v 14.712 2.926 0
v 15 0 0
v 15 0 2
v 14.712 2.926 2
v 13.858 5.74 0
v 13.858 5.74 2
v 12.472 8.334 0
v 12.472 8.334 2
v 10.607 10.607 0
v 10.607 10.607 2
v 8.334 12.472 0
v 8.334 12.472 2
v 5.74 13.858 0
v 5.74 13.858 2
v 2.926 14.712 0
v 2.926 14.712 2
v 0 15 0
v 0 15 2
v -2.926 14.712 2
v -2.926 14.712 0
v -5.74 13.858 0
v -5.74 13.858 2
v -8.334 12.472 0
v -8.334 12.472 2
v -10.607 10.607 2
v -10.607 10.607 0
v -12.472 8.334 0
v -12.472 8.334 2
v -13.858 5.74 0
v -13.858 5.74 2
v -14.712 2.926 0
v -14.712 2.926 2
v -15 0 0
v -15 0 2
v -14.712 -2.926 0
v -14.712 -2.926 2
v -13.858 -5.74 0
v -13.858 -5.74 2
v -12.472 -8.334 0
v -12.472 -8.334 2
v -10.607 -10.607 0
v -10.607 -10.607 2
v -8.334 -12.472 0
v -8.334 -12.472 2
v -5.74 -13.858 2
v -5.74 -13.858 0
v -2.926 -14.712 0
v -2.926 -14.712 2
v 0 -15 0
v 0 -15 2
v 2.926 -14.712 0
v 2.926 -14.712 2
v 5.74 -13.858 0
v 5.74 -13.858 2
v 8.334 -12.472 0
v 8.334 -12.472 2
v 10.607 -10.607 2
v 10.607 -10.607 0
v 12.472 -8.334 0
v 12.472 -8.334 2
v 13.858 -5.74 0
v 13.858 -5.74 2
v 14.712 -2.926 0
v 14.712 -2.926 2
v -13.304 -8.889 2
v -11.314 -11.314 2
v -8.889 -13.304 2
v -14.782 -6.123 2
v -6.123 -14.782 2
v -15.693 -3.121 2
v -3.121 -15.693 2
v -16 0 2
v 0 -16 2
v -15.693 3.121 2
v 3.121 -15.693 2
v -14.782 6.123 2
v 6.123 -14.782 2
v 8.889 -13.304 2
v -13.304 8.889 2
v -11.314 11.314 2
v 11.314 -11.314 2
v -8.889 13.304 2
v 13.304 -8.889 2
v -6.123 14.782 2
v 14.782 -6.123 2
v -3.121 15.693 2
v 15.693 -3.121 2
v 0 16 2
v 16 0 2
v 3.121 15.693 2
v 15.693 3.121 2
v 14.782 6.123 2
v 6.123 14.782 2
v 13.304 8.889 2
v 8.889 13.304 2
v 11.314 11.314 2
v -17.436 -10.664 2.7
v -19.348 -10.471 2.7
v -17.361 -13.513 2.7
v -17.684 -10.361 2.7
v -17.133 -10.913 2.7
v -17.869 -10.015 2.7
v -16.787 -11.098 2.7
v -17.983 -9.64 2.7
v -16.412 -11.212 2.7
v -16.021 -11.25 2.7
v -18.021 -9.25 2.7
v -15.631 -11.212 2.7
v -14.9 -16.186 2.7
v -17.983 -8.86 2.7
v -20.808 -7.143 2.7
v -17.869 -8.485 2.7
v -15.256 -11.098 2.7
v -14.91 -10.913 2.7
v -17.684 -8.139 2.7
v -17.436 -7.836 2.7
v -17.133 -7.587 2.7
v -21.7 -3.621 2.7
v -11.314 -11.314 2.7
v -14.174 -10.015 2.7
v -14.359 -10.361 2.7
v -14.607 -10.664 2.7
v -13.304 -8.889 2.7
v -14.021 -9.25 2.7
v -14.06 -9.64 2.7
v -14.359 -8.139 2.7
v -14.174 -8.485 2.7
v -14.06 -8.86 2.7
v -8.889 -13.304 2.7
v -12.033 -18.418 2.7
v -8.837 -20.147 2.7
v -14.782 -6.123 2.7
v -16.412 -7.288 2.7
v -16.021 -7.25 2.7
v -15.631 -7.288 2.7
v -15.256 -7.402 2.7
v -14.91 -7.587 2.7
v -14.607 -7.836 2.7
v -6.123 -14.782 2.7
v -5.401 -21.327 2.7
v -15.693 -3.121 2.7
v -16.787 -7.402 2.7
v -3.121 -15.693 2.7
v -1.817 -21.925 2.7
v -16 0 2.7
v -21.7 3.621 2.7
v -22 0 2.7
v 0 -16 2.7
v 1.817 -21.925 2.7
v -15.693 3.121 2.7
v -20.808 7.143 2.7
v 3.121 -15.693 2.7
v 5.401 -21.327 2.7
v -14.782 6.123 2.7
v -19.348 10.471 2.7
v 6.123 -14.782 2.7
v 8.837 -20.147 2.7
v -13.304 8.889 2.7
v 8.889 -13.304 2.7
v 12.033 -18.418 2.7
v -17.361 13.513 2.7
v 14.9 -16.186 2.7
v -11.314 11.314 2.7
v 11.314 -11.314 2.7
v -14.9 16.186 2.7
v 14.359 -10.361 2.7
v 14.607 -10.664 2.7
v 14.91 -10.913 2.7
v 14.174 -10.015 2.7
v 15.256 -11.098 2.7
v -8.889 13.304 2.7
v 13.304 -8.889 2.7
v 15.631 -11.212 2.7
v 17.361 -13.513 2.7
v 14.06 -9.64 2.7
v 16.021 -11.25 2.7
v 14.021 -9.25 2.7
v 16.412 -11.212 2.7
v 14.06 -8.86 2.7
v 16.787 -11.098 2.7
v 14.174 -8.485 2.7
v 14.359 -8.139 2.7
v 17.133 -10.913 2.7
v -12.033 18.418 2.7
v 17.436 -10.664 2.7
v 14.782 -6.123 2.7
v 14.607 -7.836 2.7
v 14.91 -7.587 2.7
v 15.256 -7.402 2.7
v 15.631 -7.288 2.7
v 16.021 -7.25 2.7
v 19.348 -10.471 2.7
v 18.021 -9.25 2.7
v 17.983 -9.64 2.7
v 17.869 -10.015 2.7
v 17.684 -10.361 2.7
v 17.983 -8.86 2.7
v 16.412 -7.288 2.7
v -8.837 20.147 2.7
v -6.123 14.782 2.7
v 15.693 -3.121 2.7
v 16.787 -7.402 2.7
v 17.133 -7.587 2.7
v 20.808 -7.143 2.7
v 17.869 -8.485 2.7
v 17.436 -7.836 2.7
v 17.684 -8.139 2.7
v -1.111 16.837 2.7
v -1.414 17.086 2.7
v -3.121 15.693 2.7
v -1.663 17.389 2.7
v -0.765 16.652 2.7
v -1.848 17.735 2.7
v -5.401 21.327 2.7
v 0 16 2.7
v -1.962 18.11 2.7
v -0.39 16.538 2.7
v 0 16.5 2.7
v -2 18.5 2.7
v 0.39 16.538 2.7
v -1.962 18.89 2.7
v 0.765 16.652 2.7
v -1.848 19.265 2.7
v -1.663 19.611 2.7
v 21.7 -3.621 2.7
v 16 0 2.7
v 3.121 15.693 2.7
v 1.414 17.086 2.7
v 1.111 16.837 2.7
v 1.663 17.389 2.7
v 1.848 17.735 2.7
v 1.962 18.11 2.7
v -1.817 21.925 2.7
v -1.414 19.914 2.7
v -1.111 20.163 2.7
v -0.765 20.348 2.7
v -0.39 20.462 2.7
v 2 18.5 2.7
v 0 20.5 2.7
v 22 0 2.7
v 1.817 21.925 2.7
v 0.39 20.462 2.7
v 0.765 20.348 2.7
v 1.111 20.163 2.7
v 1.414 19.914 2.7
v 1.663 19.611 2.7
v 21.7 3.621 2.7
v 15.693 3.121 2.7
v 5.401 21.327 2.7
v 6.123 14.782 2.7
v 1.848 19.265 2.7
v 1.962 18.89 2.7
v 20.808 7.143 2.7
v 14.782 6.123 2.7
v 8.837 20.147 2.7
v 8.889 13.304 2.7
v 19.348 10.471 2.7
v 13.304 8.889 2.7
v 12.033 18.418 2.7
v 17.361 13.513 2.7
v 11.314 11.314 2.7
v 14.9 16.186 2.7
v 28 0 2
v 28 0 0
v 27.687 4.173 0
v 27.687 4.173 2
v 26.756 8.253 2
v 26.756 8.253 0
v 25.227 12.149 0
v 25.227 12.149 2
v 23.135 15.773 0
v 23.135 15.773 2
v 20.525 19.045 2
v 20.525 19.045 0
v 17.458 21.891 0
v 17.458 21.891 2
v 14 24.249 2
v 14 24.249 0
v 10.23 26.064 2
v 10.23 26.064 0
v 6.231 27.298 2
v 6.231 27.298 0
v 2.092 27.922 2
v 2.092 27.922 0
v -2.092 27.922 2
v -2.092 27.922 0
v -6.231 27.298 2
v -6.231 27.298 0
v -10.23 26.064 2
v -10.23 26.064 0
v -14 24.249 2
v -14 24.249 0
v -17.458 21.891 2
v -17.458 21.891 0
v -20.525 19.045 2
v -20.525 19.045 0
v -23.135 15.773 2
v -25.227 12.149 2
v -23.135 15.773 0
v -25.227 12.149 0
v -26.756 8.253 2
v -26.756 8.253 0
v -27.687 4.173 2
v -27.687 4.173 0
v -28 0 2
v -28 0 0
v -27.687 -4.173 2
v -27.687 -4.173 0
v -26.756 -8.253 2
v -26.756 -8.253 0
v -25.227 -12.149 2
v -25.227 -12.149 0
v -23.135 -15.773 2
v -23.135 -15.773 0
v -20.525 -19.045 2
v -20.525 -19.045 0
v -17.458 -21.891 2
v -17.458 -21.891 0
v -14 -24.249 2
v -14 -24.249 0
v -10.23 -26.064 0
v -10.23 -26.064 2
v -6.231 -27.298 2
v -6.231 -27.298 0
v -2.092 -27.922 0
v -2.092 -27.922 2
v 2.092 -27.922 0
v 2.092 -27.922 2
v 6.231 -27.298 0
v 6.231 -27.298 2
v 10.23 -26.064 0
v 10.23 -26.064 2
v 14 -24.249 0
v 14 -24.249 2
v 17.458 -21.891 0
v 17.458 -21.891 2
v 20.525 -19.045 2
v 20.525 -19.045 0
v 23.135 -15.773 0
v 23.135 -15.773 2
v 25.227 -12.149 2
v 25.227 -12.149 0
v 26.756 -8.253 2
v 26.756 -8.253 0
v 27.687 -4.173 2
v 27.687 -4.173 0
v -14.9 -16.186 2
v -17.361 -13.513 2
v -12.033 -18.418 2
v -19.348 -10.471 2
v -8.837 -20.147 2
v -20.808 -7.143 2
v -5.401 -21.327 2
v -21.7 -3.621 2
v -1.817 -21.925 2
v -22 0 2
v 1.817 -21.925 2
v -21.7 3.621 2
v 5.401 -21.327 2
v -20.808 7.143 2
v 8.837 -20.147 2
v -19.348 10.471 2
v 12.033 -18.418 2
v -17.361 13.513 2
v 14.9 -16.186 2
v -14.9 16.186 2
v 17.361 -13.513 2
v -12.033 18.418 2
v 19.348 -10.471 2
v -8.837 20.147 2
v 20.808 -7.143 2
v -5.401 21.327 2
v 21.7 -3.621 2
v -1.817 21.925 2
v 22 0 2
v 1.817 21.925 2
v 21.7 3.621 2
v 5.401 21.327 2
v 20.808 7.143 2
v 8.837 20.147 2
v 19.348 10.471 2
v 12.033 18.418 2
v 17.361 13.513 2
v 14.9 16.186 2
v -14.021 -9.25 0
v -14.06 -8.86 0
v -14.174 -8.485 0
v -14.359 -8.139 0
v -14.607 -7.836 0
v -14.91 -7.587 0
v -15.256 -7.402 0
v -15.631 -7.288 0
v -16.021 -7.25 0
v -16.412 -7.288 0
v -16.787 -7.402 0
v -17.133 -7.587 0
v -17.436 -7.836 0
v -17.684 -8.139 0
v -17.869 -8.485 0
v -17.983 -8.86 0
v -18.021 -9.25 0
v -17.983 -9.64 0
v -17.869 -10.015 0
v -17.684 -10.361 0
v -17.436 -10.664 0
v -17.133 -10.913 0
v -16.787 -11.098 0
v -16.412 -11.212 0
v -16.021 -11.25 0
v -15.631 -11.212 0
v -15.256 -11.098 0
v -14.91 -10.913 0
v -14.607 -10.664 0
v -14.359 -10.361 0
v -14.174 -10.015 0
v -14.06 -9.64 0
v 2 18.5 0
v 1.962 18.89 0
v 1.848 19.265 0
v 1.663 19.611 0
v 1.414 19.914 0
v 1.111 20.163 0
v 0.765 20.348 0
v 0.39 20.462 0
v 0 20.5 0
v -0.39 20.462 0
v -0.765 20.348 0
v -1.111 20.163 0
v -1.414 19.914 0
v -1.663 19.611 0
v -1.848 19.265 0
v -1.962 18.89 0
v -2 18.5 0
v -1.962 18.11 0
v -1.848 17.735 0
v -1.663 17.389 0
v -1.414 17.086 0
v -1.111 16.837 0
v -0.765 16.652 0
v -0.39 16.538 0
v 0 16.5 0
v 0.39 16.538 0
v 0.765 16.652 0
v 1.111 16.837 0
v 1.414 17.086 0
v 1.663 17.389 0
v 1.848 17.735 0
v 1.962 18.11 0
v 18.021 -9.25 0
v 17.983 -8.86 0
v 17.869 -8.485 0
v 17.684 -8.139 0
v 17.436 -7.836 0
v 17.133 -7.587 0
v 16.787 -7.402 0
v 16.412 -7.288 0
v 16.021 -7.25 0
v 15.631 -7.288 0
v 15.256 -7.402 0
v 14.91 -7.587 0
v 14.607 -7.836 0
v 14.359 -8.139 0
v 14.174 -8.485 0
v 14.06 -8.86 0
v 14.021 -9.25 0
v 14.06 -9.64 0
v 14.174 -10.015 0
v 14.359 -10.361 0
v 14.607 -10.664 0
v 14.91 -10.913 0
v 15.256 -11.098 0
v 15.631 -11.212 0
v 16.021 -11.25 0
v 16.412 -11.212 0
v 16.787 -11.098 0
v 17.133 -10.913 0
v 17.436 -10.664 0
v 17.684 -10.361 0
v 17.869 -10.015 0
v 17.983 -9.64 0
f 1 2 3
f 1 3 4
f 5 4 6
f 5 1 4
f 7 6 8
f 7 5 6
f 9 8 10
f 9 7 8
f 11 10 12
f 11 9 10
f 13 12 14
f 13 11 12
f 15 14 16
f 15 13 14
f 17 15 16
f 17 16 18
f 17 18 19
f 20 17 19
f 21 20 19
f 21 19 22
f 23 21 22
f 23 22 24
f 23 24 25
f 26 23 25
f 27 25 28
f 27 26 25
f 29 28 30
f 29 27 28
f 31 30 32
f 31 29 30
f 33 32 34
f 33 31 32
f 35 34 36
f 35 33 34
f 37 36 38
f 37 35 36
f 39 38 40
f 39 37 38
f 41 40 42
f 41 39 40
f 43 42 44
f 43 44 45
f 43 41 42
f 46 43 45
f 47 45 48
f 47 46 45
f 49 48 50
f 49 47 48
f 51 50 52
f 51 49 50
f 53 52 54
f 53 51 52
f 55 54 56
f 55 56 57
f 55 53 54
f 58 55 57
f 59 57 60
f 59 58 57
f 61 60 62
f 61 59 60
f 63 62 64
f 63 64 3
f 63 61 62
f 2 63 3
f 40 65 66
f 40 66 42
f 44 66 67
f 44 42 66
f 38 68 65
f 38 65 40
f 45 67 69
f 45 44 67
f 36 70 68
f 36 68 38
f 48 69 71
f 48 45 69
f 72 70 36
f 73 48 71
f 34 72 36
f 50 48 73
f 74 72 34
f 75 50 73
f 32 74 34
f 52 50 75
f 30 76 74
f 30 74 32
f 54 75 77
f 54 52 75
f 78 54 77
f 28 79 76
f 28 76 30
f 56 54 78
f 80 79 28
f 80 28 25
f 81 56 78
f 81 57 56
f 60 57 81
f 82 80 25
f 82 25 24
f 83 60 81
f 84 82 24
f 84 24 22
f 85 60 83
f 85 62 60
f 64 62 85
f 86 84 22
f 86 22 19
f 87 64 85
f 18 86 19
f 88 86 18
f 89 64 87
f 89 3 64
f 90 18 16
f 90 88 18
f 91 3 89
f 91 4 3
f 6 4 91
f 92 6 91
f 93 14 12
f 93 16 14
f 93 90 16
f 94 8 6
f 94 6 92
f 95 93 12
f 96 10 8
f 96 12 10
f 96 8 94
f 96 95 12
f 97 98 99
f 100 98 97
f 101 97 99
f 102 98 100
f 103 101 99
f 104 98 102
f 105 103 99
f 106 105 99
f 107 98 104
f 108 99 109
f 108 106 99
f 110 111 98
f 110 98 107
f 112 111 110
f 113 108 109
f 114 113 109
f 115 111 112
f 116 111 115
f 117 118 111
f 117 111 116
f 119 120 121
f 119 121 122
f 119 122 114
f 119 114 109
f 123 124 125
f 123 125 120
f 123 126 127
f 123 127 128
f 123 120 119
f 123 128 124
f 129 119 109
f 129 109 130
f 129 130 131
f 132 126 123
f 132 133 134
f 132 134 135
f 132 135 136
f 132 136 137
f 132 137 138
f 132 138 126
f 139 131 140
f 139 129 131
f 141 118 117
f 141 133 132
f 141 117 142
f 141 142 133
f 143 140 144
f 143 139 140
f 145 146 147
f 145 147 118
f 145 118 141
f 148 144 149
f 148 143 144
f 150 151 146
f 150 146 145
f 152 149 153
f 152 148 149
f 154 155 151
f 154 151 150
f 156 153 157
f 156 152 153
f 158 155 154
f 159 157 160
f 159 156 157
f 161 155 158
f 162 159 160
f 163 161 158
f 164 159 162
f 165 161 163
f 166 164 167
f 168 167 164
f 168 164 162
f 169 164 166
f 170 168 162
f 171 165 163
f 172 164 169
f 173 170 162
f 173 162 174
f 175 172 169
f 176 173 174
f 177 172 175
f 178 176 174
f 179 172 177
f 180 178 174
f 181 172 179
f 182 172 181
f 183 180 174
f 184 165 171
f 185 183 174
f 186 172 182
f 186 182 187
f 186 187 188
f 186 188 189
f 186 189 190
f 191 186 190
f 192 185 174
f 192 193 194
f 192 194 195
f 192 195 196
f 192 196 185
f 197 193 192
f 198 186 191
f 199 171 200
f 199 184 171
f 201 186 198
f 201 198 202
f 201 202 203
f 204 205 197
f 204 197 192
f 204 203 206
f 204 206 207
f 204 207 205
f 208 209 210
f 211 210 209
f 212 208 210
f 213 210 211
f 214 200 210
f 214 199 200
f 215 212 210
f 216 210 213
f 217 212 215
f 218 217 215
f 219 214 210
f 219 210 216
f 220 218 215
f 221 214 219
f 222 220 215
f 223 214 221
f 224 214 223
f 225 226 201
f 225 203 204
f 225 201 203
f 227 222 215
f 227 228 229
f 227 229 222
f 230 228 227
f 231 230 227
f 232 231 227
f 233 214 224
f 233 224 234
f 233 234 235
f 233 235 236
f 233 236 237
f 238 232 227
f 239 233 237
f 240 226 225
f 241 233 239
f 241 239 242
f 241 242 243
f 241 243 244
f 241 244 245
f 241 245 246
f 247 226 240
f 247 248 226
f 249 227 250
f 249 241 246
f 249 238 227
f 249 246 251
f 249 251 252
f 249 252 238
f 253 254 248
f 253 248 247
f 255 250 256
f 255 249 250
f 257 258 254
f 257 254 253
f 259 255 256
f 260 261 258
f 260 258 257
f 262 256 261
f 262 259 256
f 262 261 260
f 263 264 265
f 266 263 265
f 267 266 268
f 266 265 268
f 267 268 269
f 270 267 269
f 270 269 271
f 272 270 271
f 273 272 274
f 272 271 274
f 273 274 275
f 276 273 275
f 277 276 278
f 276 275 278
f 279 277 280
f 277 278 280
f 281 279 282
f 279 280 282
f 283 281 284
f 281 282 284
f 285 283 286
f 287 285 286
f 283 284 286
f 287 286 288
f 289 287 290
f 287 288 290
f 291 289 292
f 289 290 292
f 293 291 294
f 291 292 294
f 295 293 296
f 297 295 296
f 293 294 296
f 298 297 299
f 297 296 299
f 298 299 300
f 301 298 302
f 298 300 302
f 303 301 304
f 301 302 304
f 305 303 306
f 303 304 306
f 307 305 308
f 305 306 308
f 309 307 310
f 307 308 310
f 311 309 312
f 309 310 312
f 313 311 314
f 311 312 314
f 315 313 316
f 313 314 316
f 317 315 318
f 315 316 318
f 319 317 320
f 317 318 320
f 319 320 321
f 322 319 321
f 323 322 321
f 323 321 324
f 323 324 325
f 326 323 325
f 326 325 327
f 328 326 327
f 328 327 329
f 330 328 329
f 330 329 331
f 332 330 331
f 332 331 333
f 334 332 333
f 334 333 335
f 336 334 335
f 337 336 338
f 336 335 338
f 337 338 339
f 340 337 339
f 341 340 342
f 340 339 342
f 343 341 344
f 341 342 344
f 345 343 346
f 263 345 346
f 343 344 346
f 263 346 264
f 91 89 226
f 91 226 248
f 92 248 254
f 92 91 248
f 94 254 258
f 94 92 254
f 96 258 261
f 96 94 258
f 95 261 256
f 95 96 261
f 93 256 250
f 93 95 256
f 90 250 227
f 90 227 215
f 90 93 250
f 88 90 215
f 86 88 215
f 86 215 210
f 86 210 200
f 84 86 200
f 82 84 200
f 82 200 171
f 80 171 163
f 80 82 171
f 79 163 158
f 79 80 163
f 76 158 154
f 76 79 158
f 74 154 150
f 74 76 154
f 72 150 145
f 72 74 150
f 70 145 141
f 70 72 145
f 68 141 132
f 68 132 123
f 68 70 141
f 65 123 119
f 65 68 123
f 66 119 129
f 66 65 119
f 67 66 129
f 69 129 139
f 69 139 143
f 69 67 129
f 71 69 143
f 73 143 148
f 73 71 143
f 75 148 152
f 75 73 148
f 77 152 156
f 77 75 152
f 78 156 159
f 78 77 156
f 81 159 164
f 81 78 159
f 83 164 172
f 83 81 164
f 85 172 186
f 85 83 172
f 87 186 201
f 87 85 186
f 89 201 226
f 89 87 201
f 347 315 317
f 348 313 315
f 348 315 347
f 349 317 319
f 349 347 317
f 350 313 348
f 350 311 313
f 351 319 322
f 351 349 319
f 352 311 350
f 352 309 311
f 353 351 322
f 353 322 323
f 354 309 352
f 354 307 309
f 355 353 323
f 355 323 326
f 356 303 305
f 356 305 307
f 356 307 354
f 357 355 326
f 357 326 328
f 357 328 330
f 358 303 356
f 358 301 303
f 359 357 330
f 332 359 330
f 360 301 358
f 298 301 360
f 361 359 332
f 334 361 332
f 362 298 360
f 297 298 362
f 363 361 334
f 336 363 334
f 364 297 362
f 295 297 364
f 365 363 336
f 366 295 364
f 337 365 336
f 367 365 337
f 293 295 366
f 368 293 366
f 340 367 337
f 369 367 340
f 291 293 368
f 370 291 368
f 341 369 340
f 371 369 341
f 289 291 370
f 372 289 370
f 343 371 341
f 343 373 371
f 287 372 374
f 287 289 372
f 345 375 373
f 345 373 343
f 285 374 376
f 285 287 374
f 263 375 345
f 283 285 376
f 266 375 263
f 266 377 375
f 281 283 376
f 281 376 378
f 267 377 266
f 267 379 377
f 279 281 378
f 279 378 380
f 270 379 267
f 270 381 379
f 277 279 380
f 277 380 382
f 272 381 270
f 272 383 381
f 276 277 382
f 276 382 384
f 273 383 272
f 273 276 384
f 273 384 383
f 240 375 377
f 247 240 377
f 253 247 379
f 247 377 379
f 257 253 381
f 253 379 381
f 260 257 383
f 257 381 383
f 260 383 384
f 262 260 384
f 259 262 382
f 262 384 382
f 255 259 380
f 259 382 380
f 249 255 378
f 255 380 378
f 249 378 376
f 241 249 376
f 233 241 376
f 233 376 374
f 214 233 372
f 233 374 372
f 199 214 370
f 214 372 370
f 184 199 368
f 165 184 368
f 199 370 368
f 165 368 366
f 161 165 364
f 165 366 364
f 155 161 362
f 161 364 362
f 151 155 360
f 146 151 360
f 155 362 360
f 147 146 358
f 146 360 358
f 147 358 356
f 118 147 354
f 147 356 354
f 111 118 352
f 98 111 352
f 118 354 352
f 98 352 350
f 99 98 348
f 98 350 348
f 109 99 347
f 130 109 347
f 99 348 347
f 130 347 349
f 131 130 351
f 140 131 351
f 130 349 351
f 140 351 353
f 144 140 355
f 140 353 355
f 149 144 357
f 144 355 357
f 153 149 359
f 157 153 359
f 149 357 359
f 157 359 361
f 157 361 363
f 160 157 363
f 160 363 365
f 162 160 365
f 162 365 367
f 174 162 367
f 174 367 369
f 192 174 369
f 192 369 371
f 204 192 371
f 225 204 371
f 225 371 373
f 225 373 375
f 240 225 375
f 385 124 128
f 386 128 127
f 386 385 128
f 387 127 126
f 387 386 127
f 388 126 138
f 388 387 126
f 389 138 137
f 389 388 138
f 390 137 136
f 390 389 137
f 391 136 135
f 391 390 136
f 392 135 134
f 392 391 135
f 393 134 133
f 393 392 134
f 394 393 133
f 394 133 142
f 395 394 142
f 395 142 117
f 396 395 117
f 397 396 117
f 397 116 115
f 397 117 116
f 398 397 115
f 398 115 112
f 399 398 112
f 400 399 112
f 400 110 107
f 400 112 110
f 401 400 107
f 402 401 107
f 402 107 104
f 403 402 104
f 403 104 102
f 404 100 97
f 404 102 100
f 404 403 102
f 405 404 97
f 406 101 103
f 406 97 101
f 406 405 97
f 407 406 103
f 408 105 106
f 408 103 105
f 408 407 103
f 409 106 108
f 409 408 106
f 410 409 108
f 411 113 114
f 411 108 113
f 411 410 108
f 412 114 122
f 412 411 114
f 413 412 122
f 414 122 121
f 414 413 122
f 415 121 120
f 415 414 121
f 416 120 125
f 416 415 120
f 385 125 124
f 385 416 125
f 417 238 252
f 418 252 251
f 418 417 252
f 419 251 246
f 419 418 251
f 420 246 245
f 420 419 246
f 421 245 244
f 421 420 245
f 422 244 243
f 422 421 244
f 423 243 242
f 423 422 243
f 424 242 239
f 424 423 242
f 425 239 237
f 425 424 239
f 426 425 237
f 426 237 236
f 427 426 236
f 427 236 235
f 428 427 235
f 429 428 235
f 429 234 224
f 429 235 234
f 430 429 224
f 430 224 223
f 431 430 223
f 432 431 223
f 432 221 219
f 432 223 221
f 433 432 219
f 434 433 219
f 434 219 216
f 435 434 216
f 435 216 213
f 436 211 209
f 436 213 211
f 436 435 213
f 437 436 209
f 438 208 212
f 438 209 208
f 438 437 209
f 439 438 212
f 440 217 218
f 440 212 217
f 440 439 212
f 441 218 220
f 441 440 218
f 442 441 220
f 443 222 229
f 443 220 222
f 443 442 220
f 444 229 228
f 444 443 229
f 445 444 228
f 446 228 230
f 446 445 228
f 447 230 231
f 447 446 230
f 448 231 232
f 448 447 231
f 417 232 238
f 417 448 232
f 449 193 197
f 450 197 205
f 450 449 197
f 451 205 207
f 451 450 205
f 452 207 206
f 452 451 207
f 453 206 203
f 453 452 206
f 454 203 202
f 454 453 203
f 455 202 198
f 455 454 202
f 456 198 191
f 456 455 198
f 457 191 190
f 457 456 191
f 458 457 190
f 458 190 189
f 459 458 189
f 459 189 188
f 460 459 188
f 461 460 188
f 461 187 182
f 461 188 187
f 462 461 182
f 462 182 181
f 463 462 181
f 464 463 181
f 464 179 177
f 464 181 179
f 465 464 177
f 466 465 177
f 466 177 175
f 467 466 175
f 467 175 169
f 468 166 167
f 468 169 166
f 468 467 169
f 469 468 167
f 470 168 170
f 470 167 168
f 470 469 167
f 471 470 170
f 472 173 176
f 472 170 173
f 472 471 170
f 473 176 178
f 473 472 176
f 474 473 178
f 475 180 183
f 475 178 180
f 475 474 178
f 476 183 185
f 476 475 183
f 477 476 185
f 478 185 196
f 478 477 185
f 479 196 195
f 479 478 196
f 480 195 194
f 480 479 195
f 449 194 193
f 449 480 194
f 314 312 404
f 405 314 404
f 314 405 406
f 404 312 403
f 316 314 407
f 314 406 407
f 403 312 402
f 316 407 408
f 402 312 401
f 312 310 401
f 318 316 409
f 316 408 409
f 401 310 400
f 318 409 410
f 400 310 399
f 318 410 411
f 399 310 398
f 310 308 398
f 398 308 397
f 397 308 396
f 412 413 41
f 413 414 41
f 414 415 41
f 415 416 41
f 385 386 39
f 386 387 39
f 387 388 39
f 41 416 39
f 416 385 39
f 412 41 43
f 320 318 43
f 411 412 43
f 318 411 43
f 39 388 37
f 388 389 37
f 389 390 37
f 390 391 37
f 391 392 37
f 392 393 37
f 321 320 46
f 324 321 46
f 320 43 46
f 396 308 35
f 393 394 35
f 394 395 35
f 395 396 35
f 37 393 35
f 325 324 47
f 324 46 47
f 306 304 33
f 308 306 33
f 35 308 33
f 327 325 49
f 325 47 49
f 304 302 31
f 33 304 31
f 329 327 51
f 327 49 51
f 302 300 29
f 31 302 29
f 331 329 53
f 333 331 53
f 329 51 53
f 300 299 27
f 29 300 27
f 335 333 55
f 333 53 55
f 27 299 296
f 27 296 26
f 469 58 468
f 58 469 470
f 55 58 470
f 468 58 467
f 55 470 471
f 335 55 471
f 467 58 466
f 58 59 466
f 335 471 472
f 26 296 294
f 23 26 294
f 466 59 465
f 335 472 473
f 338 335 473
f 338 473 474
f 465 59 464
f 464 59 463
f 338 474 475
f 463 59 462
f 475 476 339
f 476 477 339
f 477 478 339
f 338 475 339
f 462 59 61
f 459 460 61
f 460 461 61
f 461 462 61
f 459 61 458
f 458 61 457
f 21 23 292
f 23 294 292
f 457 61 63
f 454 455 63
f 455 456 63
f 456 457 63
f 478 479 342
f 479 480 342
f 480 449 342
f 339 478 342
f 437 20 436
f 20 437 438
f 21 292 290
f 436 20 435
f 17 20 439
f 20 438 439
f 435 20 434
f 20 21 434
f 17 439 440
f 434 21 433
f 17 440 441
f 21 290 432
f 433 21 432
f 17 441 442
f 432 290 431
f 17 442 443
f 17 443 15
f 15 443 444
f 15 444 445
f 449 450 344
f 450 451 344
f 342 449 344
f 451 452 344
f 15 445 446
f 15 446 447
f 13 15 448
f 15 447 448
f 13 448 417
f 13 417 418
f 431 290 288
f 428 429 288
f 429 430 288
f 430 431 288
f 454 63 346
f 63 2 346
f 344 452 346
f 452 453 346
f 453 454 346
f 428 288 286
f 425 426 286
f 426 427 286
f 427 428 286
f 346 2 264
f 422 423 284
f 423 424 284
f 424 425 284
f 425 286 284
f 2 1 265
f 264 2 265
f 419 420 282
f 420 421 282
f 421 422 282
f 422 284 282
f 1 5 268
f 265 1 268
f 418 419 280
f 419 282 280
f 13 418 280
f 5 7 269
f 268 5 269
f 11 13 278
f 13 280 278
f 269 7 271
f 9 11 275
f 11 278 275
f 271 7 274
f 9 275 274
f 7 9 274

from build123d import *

# Parameters (mm, degrees)
SKETCH_R      = 28
SKETCH_R_2    = 15
PAD_DEPTH     = 2
SKETCH003_R   = 22
SKETCH003_R_2 = 16
PAD001_DEPTH  = 0.7
SKETCH002_R   = 2
POCKET_DEPTH  = 2.701


with BuildPart() as part:
    # Sketch → Pad (new body)
    with BuildSketch(Plane.XY):
        Circle(SKETCH_R)
        Circle(SKETCH_R_2, mode=Mode.SUBTRACT)
    extrude(amount=PAD_DEPTH)

    # Sketch003 (on Face4 of Pad) → Pad001 (join)
    with BuildSketch(Plane.XY.offset(2)):
        Circle(SKETCH003_R)
        Circle(SKETCH003_R_2, mode=Mode.SUBTRACT)
    extrude(amount=PAD001_DEPTH)

    # Sketch002 → Pocket (cut, through all)
    with BuildSketch(Plane.XY):
        with Locations((0, 18.5)):
            Circle(SKETCH002_R)
        with Locations((16.02147, -9.25)):
            Circle(SKETCH002_R)
        with Locations((-16.02147, -9.25)):
            Circle(SKETCH002_R)
    extrude(amount=POCKET_DEPTH, mode=Mode.SUBTRACT)


solid = part.part
